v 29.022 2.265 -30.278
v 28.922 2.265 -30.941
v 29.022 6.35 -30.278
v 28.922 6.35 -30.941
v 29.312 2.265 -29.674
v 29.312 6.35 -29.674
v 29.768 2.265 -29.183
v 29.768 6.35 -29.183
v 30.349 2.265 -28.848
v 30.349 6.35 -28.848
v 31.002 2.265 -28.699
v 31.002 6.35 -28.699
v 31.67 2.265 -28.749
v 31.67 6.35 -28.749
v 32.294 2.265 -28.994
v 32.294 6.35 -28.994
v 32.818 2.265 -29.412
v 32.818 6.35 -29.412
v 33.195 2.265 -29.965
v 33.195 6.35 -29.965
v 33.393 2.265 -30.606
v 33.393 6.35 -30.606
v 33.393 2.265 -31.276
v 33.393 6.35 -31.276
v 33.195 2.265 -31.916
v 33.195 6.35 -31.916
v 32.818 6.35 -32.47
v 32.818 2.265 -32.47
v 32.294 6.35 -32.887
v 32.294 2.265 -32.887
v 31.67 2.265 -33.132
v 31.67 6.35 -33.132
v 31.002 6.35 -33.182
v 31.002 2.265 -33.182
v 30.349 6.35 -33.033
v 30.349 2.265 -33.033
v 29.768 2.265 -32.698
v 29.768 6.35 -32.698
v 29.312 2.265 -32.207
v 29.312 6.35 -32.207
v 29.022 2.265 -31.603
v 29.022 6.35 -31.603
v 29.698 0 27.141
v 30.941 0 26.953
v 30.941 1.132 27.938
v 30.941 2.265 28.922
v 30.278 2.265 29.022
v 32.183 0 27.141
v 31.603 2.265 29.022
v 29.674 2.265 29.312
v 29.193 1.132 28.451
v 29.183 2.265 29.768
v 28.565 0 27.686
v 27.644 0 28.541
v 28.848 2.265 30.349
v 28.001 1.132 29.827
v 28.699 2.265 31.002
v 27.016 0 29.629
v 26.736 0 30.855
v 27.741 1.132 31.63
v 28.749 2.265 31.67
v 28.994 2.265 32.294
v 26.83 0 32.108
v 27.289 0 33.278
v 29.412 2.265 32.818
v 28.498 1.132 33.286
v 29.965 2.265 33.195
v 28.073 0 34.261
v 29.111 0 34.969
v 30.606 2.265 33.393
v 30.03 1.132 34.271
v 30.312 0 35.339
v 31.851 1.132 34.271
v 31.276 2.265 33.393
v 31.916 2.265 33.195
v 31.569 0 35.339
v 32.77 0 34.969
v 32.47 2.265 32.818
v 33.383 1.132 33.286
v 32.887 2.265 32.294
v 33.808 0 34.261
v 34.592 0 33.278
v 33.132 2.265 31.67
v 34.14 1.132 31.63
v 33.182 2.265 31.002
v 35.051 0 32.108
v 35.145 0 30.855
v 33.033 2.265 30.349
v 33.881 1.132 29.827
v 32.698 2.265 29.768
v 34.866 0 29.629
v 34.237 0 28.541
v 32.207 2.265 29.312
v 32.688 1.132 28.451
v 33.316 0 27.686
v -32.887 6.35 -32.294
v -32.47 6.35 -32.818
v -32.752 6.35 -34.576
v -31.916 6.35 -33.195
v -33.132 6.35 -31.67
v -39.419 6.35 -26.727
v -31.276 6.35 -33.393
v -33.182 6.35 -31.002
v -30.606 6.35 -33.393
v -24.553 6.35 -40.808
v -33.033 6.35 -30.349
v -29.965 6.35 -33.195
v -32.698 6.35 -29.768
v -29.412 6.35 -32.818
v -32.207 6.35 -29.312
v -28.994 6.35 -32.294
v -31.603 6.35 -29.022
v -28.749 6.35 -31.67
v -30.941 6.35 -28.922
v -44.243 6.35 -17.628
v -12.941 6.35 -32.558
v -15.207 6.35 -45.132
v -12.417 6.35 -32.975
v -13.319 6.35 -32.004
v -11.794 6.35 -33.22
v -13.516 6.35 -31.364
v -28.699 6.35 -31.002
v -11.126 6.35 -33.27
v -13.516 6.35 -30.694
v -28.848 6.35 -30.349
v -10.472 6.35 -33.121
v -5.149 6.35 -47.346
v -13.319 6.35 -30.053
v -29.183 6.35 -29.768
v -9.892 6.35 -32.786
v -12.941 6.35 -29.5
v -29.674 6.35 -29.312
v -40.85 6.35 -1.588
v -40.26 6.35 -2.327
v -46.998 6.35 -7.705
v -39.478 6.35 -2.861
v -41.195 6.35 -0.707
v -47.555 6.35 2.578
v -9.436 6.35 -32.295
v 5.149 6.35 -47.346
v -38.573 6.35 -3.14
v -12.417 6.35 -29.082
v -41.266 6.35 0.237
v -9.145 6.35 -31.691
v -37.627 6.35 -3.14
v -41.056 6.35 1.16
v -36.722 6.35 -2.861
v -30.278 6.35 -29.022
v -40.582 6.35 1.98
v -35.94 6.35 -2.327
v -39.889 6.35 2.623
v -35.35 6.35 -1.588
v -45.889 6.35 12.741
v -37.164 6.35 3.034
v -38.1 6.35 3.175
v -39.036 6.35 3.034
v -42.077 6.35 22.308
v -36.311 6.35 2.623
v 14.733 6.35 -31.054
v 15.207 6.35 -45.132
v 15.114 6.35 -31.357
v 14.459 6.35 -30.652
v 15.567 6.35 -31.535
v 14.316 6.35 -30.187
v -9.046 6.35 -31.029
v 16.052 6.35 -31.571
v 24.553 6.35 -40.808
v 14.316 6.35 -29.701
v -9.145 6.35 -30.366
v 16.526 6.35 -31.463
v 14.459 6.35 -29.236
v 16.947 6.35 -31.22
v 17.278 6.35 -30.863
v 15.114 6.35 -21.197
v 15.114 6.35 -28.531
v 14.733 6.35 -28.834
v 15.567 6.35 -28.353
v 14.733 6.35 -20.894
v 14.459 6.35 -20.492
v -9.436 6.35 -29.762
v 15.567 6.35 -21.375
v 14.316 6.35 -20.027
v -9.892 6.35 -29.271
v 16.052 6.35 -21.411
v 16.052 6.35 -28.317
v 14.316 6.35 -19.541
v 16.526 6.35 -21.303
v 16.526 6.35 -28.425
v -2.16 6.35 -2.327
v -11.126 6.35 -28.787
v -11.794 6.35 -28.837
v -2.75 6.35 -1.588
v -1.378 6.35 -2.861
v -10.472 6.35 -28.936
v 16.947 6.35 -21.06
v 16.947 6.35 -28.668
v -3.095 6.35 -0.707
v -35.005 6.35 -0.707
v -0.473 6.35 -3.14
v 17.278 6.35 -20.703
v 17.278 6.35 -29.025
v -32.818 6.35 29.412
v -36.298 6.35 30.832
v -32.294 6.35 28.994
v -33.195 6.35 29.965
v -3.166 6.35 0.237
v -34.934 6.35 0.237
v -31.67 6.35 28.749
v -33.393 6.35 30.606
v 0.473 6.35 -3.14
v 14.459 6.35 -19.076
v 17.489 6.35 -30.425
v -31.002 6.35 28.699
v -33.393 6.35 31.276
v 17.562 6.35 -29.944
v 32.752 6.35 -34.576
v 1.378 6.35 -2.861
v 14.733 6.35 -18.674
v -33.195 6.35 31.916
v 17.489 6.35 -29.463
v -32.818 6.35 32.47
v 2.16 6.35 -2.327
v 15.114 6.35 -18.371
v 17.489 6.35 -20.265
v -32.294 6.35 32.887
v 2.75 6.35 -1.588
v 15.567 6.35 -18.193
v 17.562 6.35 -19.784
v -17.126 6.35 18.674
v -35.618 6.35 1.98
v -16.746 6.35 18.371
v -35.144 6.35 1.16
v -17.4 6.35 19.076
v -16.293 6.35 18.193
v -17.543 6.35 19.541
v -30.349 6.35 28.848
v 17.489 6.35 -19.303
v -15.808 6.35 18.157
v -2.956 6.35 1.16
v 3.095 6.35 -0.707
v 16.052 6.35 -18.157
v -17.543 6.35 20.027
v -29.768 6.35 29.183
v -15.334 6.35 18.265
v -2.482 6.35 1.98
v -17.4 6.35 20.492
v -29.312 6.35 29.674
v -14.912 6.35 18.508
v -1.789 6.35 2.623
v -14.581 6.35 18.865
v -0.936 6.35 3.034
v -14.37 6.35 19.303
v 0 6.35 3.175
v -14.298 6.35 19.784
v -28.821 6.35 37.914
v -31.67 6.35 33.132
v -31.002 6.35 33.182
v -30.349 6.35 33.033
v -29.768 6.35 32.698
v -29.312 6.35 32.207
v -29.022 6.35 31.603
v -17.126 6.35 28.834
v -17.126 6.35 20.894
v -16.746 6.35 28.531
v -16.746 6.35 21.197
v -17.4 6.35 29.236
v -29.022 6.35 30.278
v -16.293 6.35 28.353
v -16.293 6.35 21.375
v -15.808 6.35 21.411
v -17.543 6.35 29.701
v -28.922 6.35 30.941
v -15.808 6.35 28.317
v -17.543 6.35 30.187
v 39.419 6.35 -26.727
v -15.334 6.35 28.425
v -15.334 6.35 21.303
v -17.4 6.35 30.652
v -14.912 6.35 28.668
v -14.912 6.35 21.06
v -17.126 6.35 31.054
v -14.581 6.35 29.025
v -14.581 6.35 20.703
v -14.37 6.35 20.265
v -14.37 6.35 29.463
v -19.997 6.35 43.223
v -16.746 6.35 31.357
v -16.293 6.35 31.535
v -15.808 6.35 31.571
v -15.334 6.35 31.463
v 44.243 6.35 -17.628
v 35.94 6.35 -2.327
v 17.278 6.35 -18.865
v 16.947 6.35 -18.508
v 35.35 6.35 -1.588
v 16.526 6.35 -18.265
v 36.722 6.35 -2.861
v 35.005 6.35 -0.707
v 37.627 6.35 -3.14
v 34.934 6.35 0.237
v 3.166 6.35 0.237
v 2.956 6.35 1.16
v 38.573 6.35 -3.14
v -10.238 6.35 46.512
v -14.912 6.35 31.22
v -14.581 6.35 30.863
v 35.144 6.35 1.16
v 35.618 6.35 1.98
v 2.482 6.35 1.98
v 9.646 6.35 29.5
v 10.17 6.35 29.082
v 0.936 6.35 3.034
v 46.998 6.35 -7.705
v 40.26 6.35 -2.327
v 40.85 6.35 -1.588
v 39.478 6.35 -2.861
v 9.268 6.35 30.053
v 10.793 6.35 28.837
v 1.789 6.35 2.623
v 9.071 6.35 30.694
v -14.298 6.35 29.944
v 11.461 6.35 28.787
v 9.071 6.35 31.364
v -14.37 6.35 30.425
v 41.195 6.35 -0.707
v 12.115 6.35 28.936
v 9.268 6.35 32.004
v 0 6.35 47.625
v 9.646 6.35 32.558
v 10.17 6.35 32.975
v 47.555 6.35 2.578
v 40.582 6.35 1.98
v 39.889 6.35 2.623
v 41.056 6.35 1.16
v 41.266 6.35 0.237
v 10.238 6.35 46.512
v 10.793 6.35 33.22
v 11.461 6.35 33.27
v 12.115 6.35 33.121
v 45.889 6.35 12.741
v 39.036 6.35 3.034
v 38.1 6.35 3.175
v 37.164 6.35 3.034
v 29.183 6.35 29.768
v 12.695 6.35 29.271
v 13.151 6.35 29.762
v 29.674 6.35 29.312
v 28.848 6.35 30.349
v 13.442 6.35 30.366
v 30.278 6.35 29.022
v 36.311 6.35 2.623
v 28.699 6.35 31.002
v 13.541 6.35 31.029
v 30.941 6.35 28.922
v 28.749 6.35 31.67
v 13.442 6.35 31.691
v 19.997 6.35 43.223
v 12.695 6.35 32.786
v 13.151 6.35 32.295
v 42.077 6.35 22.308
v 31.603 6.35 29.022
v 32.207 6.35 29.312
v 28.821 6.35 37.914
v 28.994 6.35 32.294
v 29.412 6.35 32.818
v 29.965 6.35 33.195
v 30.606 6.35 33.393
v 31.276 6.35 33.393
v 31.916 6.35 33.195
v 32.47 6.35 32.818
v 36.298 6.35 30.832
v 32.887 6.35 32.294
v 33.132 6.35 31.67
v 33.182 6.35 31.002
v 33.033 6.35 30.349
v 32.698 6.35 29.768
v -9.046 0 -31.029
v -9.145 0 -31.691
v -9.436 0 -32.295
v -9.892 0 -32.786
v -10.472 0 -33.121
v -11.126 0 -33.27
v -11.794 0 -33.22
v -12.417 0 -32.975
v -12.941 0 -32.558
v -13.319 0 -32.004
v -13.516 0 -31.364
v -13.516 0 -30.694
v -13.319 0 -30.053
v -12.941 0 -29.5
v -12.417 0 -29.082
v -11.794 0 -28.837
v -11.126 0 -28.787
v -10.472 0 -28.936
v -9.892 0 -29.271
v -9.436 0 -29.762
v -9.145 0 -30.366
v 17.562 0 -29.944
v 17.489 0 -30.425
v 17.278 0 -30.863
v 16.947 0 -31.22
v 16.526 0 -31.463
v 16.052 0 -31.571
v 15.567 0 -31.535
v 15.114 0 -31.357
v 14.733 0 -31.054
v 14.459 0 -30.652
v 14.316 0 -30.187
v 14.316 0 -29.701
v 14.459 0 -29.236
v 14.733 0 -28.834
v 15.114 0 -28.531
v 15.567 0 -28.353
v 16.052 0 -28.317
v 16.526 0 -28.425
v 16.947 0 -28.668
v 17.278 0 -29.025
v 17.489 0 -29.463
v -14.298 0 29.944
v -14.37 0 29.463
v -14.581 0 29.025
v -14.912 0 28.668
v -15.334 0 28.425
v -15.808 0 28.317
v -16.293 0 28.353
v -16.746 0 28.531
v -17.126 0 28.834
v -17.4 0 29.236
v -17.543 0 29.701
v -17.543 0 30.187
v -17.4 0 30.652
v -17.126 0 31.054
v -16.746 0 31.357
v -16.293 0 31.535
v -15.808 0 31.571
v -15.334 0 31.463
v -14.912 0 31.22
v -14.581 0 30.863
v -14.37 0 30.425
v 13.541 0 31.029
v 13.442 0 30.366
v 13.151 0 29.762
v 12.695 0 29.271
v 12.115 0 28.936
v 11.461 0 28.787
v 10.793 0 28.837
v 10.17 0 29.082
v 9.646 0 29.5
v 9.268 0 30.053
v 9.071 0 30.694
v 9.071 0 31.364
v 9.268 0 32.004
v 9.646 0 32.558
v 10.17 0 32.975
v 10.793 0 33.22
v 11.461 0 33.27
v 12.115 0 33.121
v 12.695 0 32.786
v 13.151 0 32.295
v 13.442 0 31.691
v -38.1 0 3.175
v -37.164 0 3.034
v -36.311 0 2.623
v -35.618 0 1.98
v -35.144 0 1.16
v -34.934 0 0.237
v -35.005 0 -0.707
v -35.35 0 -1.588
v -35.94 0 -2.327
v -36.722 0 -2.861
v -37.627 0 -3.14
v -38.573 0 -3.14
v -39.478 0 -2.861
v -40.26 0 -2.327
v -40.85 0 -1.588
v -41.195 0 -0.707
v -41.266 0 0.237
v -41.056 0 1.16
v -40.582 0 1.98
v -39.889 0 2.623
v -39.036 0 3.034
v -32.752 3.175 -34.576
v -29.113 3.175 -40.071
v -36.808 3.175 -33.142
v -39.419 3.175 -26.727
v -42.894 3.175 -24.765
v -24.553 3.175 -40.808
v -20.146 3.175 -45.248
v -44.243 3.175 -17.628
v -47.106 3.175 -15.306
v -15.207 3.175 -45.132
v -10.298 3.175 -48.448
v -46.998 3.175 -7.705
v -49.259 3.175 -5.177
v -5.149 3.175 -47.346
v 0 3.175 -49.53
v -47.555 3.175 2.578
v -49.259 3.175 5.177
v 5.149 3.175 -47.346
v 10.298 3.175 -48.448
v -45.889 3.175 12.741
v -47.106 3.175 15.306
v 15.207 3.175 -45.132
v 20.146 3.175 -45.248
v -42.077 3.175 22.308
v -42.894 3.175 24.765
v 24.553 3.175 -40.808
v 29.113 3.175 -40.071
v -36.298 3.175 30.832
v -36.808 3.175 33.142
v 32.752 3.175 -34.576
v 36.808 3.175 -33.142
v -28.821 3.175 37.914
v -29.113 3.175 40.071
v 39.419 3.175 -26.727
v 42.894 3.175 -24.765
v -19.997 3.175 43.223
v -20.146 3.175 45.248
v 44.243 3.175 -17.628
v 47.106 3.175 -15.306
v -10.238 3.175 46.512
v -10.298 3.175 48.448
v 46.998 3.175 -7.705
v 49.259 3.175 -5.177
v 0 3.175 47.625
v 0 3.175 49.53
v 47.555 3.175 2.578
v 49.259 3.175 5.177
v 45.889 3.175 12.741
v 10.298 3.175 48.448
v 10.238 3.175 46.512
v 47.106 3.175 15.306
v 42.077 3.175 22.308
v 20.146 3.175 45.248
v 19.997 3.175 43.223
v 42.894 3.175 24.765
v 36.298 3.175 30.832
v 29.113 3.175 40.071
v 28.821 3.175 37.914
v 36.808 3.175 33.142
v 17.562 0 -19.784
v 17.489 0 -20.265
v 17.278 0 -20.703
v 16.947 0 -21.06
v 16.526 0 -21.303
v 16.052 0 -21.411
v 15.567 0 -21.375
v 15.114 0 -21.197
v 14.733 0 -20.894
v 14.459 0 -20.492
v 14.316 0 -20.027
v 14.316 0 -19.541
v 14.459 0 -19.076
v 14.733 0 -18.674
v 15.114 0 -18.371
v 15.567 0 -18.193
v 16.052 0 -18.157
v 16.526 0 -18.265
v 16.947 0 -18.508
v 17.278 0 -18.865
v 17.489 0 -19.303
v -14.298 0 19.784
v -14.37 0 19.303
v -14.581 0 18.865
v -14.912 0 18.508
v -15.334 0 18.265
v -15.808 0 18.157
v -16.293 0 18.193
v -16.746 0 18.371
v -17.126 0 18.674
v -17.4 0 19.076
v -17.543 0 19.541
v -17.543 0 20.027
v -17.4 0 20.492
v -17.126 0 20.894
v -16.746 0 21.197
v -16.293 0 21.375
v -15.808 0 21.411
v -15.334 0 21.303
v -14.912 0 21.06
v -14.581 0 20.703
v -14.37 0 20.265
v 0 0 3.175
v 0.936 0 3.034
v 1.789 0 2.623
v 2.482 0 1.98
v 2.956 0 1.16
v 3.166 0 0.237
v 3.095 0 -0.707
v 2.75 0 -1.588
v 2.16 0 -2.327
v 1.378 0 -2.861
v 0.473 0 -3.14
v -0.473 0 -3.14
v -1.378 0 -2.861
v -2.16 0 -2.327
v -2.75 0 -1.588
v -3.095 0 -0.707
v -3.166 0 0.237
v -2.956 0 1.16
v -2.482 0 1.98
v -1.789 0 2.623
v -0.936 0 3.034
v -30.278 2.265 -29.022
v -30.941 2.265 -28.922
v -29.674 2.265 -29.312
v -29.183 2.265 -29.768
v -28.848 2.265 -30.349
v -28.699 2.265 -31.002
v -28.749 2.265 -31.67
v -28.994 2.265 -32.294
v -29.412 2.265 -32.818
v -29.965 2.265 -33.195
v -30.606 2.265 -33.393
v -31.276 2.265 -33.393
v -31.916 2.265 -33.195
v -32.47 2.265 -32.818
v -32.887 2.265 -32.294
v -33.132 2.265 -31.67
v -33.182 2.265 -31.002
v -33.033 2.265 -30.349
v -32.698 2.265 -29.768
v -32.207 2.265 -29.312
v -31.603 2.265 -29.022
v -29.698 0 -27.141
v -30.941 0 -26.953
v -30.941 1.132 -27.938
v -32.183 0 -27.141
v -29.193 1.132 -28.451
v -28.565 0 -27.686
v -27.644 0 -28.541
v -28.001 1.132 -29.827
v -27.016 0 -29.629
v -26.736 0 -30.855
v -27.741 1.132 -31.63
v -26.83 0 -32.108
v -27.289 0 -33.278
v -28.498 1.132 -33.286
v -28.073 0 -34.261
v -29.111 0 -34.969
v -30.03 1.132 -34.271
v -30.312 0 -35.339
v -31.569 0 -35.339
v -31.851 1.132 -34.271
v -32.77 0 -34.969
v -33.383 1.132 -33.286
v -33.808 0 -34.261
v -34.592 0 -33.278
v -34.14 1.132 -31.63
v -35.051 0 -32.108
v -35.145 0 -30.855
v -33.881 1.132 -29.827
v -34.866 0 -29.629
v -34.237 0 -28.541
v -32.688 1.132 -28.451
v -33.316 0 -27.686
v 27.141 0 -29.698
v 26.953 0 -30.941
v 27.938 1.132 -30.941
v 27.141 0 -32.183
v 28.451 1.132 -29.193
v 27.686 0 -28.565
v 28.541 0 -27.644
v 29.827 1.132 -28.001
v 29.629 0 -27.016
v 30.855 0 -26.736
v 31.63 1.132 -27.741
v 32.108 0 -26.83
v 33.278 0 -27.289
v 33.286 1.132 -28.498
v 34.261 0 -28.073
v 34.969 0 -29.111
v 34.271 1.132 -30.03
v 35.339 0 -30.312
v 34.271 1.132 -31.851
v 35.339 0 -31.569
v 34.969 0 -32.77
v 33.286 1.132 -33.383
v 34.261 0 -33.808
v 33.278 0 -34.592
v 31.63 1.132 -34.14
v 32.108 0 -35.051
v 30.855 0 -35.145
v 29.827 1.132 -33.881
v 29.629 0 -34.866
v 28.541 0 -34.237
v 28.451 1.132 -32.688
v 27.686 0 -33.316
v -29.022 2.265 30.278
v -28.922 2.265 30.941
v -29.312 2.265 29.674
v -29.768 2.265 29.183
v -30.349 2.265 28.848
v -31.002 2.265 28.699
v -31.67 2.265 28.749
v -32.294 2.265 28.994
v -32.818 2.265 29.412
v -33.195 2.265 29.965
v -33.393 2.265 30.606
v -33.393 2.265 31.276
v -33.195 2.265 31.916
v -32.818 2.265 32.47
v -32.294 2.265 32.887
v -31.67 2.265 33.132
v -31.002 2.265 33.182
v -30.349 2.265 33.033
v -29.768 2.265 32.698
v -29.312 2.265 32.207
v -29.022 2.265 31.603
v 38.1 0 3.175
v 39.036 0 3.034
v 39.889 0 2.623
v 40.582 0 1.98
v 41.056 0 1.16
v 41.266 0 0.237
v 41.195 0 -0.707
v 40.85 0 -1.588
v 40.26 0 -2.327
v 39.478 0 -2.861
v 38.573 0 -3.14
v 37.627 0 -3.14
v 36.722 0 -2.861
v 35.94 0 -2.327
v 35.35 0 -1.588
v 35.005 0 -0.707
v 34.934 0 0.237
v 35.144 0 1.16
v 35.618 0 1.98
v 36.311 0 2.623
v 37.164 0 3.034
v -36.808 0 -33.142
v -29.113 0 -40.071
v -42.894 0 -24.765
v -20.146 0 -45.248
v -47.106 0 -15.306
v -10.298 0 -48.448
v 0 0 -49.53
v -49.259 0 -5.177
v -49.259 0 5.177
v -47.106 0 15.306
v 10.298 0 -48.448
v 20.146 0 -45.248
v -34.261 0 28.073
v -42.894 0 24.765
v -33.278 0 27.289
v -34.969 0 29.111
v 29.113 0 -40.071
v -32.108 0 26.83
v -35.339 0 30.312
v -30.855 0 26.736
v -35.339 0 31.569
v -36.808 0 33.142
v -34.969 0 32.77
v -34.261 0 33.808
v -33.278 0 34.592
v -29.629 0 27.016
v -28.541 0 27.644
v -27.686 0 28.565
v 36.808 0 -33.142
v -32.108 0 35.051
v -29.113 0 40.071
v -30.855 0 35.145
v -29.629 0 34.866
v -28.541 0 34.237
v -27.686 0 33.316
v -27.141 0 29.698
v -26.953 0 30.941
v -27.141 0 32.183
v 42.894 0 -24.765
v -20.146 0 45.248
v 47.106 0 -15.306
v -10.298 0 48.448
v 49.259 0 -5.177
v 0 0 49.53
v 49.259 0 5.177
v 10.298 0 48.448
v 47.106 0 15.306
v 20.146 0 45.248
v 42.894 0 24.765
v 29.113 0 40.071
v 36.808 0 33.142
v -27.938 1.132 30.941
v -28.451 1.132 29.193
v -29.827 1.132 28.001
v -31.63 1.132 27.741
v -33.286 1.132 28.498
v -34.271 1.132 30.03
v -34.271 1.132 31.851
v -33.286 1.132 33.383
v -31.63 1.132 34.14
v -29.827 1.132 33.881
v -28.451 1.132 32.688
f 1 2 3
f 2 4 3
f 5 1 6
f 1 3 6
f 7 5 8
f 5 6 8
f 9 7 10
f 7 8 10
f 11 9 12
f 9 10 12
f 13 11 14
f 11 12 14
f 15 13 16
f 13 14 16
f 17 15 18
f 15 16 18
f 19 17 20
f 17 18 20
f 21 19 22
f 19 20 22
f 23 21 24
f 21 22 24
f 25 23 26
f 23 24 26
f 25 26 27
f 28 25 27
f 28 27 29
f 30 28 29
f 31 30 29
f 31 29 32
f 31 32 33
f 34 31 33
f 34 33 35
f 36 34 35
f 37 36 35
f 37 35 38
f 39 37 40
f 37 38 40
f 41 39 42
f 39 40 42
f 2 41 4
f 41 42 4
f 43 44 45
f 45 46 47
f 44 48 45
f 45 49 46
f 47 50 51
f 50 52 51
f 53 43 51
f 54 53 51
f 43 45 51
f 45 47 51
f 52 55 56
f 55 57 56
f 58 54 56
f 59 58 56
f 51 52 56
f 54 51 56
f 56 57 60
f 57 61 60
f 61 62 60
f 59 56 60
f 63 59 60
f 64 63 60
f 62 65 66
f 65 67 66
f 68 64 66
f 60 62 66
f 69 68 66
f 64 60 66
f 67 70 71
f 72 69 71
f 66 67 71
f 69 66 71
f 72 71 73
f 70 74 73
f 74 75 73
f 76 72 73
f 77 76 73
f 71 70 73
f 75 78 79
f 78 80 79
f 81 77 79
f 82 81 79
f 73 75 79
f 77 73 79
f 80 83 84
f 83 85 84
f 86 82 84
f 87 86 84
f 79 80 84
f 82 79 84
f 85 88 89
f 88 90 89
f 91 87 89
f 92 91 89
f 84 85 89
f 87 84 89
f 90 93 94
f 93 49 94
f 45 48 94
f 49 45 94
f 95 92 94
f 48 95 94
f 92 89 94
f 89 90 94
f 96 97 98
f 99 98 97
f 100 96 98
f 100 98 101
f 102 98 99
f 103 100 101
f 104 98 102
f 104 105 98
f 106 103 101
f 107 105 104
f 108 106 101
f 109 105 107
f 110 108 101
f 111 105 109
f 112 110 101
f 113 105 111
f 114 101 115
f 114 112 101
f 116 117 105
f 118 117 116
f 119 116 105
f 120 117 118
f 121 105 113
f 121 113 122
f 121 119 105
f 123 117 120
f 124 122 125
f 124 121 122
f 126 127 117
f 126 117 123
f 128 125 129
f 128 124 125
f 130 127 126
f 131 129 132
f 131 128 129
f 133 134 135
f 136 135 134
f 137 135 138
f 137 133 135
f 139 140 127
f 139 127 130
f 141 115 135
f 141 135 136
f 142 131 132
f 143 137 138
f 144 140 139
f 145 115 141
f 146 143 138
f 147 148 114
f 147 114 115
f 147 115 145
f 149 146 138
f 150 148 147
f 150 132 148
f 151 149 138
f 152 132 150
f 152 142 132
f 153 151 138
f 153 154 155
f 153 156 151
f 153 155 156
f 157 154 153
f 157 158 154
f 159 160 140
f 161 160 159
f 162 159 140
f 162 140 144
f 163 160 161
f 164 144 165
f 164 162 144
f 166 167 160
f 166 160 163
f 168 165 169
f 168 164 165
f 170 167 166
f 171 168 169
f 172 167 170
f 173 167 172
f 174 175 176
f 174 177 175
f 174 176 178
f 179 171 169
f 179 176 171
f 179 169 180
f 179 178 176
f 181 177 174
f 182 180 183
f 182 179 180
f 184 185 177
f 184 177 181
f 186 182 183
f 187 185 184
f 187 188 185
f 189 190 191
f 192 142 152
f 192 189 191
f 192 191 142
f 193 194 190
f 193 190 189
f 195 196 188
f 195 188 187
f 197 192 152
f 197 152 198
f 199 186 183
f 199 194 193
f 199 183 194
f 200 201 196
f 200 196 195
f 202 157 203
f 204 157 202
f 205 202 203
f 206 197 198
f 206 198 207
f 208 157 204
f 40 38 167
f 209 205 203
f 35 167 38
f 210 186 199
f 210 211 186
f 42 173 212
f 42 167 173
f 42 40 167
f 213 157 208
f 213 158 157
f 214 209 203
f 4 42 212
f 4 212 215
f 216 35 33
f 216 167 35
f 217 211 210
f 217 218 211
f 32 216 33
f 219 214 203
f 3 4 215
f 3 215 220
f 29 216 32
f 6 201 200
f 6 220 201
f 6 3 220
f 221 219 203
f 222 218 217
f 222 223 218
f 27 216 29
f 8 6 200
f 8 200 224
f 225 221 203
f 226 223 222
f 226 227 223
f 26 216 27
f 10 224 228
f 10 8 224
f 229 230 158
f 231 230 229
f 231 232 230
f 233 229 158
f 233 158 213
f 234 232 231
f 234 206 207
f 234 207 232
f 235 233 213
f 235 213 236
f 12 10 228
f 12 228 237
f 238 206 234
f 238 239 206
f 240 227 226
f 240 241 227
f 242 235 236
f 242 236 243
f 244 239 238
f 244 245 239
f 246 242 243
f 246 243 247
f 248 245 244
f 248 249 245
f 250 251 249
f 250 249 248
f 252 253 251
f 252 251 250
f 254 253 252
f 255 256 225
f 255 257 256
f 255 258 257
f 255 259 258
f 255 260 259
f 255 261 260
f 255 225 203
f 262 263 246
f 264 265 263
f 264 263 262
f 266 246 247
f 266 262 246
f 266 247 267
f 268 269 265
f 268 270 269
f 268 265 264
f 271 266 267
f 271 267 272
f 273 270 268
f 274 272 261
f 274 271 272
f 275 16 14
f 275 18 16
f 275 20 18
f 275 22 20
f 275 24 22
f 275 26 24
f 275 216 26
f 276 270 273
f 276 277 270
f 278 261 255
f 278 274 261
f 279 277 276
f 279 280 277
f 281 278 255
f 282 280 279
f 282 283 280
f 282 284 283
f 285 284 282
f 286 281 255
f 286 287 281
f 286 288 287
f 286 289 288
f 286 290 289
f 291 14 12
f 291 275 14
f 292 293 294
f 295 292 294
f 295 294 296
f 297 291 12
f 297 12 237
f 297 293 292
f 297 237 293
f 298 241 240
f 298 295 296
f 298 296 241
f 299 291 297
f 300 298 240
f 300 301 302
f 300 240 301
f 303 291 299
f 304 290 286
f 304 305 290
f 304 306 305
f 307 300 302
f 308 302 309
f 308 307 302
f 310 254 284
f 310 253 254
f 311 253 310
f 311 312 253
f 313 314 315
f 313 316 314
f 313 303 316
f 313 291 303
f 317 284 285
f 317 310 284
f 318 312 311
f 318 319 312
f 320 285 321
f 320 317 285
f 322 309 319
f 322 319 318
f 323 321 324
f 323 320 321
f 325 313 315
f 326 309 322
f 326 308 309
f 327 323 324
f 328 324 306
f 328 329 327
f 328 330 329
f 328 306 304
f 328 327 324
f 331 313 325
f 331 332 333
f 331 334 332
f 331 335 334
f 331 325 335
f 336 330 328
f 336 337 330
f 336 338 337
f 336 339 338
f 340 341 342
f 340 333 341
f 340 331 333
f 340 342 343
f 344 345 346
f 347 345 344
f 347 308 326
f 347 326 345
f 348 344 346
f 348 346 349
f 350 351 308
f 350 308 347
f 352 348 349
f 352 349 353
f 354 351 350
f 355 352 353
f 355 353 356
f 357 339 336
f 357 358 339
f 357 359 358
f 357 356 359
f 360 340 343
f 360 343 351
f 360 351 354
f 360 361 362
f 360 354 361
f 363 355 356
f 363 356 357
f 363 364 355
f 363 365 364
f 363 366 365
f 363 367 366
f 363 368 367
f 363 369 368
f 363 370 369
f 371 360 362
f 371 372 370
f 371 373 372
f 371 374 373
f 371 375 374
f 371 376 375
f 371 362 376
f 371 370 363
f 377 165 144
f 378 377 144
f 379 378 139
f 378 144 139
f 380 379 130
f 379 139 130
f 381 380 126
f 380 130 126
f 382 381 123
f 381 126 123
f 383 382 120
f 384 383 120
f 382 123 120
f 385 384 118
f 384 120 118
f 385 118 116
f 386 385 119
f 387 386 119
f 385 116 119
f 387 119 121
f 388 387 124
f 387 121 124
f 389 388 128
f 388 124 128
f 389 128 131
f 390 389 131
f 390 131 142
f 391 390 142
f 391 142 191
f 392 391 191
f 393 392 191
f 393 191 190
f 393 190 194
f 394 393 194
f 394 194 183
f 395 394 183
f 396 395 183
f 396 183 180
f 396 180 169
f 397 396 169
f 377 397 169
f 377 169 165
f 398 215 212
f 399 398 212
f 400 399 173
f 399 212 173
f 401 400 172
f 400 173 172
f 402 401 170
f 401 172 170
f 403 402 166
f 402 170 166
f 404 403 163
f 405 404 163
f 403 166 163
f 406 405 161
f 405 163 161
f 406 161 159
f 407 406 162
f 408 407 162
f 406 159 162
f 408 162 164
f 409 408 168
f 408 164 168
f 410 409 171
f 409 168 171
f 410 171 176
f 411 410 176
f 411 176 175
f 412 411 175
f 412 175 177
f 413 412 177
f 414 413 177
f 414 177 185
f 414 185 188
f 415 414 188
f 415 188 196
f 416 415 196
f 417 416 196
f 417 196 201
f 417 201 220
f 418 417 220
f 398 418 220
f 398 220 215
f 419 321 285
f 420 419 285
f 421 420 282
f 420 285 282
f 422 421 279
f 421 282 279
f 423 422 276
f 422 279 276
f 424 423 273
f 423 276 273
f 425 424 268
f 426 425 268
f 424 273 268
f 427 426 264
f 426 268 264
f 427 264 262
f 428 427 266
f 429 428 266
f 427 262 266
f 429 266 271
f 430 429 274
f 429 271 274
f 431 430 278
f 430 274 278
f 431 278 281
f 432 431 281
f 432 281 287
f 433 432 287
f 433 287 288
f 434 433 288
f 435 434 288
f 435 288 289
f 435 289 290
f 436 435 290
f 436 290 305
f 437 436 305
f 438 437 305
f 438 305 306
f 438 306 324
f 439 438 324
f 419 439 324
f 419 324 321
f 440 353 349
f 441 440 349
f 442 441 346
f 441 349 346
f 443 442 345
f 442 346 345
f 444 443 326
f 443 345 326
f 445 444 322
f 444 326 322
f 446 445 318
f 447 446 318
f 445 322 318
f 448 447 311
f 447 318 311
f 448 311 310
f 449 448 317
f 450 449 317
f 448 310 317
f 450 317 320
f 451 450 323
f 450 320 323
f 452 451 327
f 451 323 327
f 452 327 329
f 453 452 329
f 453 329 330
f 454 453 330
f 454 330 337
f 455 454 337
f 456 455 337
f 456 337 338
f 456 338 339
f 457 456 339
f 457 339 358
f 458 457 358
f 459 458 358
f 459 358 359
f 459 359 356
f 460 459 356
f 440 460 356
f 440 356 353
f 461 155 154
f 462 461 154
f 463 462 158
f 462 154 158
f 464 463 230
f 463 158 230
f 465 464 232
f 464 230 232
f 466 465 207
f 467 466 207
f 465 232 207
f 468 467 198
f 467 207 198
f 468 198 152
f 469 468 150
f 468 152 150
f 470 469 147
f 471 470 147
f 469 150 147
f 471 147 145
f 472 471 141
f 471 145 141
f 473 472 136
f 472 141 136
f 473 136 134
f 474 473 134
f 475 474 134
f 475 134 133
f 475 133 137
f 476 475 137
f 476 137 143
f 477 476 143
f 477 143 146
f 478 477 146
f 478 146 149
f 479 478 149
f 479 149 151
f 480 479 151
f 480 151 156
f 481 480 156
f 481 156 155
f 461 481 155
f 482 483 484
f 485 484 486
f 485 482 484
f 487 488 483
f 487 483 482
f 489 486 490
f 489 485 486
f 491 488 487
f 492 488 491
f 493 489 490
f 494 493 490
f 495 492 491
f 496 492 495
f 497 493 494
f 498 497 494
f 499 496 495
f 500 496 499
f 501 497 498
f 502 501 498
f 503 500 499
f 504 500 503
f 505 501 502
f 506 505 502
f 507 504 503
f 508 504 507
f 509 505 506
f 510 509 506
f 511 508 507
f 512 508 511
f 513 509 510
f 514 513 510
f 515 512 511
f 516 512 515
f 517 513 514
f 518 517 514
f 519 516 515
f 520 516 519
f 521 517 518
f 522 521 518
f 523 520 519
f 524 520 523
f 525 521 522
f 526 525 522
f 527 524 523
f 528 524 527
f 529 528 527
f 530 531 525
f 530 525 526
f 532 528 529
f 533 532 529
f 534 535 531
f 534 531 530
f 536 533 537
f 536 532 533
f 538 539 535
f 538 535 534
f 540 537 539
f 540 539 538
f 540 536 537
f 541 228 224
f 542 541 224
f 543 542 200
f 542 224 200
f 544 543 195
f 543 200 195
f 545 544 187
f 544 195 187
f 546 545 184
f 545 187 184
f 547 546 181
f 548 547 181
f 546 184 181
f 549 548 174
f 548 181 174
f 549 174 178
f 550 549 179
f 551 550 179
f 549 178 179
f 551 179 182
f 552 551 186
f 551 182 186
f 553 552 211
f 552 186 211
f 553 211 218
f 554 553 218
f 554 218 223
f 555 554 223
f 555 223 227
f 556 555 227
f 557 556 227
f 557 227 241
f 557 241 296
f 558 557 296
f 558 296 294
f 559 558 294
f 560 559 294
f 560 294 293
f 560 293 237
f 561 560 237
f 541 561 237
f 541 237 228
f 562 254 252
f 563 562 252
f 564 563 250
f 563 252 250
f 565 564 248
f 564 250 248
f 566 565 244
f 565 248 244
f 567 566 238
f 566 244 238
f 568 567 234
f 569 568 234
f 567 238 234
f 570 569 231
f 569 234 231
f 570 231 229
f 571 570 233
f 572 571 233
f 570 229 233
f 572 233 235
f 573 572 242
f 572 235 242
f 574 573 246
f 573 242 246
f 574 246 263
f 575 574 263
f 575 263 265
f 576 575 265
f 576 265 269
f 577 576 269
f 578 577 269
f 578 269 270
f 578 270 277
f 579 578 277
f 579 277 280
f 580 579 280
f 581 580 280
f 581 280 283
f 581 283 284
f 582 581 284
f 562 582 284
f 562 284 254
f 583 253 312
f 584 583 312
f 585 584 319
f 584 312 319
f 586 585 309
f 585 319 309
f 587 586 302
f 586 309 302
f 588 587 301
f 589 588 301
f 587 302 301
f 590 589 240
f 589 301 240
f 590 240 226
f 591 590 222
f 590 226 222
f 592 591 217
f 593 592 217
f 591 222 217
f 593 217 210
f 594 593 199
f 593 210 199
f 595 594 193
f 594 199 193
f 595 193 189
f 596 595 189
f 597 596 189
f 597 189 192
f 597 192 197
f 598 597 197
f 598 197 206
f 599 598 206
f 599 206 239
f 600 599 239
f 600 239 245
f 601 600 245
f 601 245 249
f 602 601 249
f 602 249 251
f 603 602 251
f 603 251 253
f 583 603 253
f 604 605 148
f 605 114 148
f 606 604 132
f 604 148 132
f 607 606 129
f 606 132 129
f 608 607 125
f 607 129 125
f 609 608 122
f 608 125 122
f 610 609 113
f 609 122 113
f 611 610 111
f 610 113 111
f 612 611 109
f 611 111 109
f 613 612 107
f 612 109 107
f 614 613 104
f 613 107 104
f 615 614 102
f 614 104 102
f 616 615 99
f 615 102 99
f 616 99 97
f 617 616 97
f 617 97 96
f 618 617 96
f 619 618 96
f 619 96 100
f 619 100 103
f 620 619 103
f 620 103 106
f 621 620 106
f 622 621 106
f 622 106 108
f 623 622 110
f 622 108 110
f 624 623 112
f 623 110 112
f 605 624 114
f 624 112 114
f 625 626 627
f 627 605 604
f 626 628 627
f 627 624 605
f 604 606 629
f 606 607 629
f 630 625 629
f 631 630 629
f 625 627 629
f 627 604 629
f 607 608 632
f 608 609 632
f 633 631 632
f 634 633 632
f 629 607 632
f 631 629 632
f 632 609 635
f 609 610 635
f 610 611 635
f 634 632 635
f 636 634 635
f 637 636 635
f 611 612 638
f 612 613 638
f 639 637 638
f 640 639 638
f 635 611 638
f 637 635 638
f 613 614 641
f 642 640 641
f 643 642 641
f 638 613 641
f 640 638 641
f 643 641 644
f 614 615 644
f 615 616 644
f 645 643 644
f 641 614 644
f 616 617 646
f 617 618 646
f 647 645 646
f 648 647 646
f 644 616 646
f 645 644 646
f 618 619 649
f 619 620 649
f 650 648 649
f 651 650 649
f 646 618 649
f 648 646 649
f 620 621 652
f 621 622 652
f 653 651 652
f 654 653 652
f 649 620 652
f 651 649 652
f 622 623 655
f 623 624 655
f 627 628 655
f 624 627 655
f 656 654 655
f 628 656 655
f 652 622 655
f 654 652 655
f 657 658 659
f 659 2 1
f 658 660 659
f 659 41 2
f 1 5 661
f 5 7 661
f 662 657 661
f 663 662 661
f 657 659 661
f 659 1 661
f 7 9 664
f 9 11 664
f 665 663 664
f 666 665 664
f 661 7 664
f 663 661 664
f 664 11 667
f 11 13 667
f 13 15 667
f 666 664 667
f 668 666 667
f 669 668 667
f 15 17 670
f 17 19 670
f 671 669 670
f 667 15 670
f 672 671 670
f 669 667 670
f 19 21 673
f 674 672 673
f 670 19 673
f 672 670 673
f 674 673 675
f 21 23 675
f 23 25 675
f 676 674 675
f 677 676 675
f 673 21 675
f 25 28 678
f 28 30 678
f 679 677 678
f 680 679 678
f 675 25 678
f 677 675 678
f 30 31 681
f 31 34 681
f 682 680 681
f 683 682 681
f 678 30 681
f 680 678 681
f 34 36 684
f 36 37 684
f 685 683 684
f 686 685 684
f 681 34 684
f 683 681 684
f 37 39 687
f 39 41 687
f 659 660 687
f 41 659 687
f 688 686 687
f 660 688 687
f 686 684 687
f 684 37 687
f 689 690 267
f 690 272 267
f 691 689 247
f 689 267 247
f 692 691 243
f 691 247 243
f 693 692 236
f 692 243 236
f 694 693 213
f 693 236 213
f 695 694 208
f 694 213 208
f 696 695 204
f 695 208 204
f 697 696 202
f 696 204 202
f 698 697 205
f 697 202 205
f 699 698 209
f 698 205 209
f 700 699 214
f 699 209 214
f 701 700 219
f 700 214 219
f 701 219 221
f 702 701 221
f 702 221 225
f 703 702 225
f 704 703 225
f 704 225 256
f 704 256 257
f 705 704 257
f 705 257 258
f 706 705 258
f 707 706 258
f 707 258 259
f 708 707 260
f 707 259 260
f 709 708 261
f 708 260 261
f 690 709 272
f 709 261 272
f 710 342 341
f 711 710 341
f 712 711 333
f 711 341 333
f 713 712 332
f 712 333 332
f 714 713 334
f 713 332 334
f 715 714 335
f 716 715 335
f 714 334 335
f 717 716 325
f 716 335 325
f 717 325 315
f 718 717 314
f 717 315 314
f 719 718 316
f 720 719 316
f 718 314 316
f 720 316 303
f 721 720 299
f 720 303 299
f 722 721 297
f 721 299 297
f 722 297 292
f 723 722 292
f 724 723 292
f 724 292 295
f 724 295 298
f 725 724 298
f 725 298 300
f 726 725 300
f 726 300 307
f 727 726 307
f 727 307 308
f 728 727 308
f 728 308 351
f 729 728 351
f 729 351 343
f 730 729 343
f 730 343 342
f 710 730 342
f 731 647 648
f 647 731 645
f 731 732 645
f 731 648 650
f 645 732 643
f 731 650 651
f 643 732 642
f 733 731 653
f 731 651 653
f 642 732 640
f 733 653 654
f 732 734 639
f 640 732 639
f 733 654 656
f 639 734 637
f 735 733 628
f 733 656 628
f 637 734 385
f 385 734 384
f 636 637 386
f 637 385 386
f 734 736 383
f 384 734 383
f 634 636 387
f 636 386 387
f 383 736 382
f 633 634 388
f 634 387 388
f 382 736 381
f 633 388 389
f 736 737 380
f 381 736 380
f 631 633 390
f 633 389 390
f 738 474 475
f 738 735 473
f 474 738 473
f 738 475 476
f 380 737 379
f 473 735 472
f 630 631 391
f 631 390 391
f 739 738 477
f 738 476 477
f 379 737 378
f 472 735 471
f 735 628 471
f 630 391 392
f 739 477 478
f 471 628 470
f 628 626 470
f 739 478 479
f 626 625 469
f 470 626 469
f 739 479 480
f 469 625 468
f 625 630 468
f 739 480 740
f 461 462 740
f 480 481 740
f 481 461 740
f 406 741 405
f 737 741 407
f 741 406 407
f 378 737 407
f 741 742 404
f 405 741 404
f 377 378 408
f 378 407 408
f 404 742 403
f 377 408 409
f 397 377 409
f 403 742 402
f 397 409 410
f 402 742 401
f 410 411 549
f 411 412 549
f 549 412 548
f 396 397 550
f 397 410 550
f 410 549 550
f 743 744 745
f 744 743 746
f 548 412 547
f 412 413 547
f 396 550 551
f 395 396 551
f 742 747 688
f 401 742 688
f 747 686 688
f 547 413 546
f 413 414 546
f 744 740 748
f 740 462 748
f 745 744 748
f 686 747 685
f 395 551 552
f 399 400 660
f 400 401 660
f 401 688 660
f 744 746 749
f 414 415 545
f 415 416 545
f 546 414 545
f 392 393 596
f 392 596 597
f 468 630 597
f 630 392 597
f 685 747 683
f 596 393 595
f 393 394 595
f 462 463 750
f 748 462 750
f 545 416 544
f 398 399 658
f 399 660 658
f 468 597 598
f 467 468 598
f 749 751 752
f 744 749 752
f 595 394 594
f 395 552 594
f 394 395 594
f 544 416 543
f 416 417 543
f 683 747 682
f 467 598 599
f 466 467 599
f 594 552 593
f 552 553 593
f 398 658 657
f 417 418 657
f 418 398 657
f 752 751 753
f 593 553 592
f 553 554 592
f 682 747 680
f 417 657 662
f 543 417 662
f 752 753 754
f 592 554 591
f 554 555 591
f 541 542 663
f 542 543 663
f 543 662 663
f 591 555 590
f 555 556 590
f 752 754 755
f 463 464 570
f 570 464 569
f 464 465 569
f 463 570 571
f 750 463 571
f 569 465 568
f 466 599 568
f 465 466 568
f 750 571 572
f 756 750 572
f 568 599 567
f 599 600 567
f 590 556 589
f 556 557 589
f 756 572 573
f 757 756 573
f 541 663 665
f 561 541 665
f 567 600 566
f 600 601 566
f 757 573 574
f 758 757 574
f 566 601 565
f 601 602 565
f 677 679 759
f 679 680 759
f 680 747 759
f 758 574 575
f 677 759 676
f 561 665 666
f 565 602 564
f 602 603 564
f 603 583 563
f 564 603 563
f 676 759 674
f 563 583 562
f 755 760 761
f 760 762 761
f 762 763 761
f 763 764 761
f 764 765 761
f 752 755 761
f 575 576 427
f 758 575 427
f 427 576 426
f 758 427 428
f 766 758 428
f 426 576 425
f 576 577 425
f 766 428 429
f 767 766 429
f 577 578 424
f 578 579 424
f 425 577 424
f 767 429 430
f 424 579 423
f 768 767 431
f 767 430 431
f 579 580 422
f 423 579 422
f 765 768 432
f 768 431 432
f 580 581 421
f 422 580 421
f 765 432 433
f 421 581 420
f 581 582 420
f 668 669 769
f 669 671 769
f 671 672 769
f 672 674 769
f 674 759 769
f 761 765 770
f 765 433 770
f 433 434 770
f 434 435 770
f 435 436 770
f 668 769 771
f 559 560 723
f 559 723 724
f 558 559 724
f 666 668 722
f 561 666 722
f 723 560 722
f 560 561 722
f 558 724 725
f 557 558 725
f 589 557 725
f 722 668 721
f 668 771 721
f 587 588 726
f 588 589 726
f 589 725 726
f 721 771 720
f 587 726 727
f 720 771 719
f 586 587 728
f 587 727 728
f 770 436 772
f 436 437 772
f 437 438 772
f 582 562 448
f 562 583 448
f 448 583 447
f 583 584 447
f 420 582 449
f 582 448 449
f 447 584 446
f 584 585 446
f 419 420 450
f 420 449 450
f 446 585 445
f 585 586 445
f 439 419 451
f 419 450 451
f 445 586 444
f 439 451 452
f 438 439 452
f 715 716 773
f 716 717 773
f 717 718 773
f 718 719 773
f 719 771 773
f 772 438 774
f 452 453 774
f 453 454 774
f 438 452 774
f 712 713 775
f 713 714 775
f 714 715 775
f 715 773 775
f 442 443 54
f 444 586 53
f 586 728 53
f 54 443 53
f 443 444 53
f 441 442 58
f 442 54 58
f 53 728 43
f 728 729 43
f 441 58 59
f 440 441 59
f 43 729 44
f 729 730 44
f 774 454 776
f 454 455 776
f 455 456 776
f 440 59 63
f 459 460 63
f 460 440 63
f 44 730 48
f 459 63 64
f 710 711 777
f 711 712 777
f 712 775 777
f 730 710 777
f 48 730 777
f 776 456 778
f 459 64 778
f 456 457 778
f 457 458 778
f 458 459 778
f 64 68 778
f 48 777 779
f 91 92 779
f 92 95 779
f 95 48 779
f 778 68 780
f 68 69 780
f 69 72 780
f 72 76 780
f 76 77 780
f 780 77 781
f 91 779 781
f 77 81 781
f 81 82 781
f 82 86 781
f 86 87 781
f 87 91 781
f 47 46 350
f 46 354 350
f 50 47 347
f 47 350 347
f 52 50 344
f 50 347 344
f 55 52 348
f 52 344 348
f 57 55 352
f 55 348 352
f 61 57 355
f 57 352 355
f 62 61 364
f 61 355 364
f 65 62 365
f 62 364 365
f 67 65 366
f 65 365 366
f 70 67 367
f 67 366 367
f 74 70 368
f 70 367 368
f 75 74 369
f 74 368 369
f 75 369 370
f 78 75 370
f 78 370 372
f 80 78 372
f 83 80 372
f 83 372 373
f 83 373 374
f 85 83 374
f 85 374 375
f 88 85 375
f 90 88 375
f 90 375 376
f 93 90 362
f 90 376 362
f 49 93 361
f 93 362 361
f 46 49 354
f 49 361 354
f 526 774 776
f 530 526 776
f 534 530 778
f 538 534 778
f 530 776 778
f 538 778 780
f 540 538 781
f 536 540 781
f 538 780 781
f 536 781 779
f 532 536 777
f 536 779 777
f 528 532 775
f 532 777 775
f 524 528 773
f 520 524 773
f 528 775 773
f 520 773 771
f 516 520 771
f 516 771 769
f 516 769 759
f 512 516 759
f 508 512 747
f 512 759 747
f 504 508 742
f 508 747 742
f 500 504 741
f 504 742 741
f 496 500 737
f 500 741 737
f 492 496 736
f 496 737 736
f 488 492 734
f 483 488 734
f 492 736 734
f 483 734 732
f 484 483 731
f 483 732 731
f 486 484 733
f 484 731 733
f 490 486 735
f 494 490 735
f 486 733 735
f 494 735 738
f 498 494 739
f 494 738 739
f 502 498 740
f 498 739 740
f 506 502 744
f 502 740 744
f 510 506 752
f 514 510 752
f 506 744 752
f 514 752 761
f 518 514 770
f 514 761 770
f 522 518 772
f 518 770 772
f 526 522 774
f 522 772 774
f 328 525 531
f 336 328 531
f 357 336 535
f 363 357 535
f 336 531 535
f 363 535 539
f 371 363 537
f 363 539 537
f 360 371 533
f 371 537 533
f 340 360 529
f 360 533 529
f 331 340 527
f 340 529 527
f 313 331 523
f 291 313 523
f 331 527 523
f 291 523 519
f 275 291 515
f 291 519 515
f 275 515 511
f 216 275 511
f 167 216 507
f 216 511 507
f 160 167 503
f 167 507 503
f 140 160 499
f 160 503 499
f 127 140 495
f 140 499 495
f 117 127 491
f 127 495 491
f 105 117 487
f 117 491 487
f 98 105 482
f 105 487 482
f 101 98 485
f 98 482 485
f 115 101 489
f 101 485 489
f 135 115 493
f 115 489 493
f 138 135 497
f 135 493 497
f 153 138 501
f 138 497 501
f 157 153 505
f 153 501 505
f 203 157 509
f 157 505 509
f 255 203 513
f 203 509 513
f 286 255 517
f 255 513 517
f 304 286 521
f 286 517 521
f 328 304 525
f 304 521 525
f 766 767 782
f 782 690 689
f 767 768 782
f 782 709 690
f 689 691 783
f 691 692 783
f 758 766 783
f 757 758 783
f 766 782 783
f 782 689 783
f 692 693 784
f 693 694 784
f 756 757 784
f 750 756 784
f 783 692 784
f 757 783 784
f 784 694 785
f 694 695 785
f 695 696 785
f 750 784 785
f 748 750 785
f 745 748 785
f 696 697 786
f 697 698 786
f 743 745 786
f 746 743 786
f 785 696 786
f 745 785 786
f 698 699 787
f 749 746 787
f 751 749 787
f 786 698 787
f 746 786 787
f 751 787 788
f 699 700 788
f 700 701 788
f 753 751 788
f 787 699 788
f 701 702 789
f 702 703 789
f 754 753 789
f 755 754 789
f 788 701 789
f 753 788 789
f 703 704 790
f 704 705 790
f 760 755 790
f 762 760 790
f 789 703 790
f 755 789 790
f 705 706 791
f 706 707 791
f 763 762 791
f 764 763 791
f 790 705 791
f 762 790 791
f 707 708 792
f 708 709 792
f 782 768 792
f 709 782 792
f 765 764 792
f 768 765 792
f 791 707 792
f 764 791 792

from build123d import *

# Parameters (mm, degrees)
SKETCH1_R                                      = 49.53
BOSS_EXTRUDE1_DEPTH                            = 3.175
SKETCH2_R                                      = 47.625
BOSS_EXTRUDE2_DEPTH                            = 3.175
SKETCH3_R                                      = 3.175
CUT_EXTRUDE1_DEPTH                             = 71.33323752
SKETCH5_R                                      = 3.175
CUT_EXTRUDE2_DEPTH                             = 71.33323752
CSK_FOR_8_FLAT_HEAD_MACHINE_SCREW2_D           = 4.4958
CSK_FOR_8_FLAT_HEAD_MACHINE_SCREW2_CSINK_D     = 8.4328
CSK_FOR_8_FLAT_HEAD_MACHINE_SCREW2_CSINK_ANGLE = 82
CIRPATTERN1_COUNT                              = 4
F_8_CLEARANCE_HOLE1_D                          = 4.4958
F_4_CLEARANCE_HOLE1_D                          = 3.2639


with BuildPart() as part:
    # Sketch1 → Boss-Extrude1 (new body)
    with BuildSketch(Plane(origin=(0, 0, 0), x_dir=(1, 0, 0), z_dir=(0, 1, 0))):
        with Locations(Location((0, 0, 0), (0, 0, 270))):
            Circle(SKETCH1_R)
    extrude(amount=BOSS_EXTRUDE1_DEPTH)

    # Sketch2 → Boss-Extrude2 (add)
    with BuildSketch(Plane(origin=(0, 3.175, 0), x_dir=(1, 0, 0), z_dir=(0, 1, 0))):
        with Locations(Location((0, 0, 0), (0, 0, 270))):
            Circle(SKETCH2_R)
    extrude(amount=BOSS_EXTRUDE2_DEPTH)

    # Sketch3 → Cut-Extrude1 (cut, through all)
    with BuildSketch(Plane(origin=(0, 6.35, 0), x_dir=(1, 0, 0), z_dir=(0, 1, 0))):
        with Locations(Location((-38.1, 0, 0), (0, 0, 270))):
            Circle(SKETCH3_R)
        with Locations(Location((38.1, 0, 0), (0, 0, 270))):
            Circle(SKETCH3_R)
    extrude(amount=-CUT_EXTRUDE1_DEPTH, mode=Mode.SUBTRACT)

    # Sketch5 → Cut-Extrude2 (cut, through all)
    with BuildSketch(Plane(origin=(0, 6.35, 0), x_dir=(1, 0, 0), z_dir=(0, 1, 0))):
        with Locations(Location((0, 0, 0), (0, 0, 270))):
            Circle(SKETCH5_R)
    extrude(amount=-CUT_EXTRUDE2_DEPTH, mode=Mode.SUBTRACT)

    # CSK for #8 Flat Head Machine Screw2 (through all)
    with Locations(Plane(origin=(0, 0, 0), x_dir=(-1, 0, 0), z_dir=(0, -1, 0))):
        with Locations((31.169774814, -30.940594366)):
            csk_for_8_flat_head_machine_screw2 = CounterSinkHole(CSK_FOR_8_FLAT_HEAD_MACHINE_SCREW2_D / 2, CSK_FOR_8_FLAT_HEAD_MACHINE_SCREW2_CSINK_D / 2, counter_sink_angle=CSK_FOR_8_FLAT_HEAD_MACHINE_SCREW2_CSINK_ANGLE)

    # CirPattern1: CSK for #8 Flat Head Machine Screw2 ×4 about axis
    cirpattern1_axis = Axis((0, 0, 0), (0, 1, 0))
    for i in range(1, CIRPATTERN1_COUNT):
        add(csk_for_8_flat_head_machine_screw2.rotate(cirpattern1_axis, i * 360 / CIRPATTERN1_COUNT), mode=Mode.SUBTRACT)

    # #8 Clearance Hole1 (through all)
    with Locations(Plane(origin=(0, 0, 0), x_dir=(-1, 0, 0), z_dir=(0, -1, 0))):
        with Locations((11.293505133, 31.028650338), (-11.293505133, -31.028650338)):
            Hole(F_8_CLEARANCE_HOLE1_D / 2)

    # #4 Clearance Hole1 (through all)
    with Locations(Plane(origin=(0, 0, 0), x_dir=(-1, 0, 0), z_dir=(0, -1, 0))):
        with Locations((-15.929774814, 19.783889264), (15.929774814, -19.783889264), (-15.929774814, 29.943889264), (15.929774814, -29.943889264)):
            Hole(F_4_CLEARANCE_HOLE1_D / 2)


solid = part.part
